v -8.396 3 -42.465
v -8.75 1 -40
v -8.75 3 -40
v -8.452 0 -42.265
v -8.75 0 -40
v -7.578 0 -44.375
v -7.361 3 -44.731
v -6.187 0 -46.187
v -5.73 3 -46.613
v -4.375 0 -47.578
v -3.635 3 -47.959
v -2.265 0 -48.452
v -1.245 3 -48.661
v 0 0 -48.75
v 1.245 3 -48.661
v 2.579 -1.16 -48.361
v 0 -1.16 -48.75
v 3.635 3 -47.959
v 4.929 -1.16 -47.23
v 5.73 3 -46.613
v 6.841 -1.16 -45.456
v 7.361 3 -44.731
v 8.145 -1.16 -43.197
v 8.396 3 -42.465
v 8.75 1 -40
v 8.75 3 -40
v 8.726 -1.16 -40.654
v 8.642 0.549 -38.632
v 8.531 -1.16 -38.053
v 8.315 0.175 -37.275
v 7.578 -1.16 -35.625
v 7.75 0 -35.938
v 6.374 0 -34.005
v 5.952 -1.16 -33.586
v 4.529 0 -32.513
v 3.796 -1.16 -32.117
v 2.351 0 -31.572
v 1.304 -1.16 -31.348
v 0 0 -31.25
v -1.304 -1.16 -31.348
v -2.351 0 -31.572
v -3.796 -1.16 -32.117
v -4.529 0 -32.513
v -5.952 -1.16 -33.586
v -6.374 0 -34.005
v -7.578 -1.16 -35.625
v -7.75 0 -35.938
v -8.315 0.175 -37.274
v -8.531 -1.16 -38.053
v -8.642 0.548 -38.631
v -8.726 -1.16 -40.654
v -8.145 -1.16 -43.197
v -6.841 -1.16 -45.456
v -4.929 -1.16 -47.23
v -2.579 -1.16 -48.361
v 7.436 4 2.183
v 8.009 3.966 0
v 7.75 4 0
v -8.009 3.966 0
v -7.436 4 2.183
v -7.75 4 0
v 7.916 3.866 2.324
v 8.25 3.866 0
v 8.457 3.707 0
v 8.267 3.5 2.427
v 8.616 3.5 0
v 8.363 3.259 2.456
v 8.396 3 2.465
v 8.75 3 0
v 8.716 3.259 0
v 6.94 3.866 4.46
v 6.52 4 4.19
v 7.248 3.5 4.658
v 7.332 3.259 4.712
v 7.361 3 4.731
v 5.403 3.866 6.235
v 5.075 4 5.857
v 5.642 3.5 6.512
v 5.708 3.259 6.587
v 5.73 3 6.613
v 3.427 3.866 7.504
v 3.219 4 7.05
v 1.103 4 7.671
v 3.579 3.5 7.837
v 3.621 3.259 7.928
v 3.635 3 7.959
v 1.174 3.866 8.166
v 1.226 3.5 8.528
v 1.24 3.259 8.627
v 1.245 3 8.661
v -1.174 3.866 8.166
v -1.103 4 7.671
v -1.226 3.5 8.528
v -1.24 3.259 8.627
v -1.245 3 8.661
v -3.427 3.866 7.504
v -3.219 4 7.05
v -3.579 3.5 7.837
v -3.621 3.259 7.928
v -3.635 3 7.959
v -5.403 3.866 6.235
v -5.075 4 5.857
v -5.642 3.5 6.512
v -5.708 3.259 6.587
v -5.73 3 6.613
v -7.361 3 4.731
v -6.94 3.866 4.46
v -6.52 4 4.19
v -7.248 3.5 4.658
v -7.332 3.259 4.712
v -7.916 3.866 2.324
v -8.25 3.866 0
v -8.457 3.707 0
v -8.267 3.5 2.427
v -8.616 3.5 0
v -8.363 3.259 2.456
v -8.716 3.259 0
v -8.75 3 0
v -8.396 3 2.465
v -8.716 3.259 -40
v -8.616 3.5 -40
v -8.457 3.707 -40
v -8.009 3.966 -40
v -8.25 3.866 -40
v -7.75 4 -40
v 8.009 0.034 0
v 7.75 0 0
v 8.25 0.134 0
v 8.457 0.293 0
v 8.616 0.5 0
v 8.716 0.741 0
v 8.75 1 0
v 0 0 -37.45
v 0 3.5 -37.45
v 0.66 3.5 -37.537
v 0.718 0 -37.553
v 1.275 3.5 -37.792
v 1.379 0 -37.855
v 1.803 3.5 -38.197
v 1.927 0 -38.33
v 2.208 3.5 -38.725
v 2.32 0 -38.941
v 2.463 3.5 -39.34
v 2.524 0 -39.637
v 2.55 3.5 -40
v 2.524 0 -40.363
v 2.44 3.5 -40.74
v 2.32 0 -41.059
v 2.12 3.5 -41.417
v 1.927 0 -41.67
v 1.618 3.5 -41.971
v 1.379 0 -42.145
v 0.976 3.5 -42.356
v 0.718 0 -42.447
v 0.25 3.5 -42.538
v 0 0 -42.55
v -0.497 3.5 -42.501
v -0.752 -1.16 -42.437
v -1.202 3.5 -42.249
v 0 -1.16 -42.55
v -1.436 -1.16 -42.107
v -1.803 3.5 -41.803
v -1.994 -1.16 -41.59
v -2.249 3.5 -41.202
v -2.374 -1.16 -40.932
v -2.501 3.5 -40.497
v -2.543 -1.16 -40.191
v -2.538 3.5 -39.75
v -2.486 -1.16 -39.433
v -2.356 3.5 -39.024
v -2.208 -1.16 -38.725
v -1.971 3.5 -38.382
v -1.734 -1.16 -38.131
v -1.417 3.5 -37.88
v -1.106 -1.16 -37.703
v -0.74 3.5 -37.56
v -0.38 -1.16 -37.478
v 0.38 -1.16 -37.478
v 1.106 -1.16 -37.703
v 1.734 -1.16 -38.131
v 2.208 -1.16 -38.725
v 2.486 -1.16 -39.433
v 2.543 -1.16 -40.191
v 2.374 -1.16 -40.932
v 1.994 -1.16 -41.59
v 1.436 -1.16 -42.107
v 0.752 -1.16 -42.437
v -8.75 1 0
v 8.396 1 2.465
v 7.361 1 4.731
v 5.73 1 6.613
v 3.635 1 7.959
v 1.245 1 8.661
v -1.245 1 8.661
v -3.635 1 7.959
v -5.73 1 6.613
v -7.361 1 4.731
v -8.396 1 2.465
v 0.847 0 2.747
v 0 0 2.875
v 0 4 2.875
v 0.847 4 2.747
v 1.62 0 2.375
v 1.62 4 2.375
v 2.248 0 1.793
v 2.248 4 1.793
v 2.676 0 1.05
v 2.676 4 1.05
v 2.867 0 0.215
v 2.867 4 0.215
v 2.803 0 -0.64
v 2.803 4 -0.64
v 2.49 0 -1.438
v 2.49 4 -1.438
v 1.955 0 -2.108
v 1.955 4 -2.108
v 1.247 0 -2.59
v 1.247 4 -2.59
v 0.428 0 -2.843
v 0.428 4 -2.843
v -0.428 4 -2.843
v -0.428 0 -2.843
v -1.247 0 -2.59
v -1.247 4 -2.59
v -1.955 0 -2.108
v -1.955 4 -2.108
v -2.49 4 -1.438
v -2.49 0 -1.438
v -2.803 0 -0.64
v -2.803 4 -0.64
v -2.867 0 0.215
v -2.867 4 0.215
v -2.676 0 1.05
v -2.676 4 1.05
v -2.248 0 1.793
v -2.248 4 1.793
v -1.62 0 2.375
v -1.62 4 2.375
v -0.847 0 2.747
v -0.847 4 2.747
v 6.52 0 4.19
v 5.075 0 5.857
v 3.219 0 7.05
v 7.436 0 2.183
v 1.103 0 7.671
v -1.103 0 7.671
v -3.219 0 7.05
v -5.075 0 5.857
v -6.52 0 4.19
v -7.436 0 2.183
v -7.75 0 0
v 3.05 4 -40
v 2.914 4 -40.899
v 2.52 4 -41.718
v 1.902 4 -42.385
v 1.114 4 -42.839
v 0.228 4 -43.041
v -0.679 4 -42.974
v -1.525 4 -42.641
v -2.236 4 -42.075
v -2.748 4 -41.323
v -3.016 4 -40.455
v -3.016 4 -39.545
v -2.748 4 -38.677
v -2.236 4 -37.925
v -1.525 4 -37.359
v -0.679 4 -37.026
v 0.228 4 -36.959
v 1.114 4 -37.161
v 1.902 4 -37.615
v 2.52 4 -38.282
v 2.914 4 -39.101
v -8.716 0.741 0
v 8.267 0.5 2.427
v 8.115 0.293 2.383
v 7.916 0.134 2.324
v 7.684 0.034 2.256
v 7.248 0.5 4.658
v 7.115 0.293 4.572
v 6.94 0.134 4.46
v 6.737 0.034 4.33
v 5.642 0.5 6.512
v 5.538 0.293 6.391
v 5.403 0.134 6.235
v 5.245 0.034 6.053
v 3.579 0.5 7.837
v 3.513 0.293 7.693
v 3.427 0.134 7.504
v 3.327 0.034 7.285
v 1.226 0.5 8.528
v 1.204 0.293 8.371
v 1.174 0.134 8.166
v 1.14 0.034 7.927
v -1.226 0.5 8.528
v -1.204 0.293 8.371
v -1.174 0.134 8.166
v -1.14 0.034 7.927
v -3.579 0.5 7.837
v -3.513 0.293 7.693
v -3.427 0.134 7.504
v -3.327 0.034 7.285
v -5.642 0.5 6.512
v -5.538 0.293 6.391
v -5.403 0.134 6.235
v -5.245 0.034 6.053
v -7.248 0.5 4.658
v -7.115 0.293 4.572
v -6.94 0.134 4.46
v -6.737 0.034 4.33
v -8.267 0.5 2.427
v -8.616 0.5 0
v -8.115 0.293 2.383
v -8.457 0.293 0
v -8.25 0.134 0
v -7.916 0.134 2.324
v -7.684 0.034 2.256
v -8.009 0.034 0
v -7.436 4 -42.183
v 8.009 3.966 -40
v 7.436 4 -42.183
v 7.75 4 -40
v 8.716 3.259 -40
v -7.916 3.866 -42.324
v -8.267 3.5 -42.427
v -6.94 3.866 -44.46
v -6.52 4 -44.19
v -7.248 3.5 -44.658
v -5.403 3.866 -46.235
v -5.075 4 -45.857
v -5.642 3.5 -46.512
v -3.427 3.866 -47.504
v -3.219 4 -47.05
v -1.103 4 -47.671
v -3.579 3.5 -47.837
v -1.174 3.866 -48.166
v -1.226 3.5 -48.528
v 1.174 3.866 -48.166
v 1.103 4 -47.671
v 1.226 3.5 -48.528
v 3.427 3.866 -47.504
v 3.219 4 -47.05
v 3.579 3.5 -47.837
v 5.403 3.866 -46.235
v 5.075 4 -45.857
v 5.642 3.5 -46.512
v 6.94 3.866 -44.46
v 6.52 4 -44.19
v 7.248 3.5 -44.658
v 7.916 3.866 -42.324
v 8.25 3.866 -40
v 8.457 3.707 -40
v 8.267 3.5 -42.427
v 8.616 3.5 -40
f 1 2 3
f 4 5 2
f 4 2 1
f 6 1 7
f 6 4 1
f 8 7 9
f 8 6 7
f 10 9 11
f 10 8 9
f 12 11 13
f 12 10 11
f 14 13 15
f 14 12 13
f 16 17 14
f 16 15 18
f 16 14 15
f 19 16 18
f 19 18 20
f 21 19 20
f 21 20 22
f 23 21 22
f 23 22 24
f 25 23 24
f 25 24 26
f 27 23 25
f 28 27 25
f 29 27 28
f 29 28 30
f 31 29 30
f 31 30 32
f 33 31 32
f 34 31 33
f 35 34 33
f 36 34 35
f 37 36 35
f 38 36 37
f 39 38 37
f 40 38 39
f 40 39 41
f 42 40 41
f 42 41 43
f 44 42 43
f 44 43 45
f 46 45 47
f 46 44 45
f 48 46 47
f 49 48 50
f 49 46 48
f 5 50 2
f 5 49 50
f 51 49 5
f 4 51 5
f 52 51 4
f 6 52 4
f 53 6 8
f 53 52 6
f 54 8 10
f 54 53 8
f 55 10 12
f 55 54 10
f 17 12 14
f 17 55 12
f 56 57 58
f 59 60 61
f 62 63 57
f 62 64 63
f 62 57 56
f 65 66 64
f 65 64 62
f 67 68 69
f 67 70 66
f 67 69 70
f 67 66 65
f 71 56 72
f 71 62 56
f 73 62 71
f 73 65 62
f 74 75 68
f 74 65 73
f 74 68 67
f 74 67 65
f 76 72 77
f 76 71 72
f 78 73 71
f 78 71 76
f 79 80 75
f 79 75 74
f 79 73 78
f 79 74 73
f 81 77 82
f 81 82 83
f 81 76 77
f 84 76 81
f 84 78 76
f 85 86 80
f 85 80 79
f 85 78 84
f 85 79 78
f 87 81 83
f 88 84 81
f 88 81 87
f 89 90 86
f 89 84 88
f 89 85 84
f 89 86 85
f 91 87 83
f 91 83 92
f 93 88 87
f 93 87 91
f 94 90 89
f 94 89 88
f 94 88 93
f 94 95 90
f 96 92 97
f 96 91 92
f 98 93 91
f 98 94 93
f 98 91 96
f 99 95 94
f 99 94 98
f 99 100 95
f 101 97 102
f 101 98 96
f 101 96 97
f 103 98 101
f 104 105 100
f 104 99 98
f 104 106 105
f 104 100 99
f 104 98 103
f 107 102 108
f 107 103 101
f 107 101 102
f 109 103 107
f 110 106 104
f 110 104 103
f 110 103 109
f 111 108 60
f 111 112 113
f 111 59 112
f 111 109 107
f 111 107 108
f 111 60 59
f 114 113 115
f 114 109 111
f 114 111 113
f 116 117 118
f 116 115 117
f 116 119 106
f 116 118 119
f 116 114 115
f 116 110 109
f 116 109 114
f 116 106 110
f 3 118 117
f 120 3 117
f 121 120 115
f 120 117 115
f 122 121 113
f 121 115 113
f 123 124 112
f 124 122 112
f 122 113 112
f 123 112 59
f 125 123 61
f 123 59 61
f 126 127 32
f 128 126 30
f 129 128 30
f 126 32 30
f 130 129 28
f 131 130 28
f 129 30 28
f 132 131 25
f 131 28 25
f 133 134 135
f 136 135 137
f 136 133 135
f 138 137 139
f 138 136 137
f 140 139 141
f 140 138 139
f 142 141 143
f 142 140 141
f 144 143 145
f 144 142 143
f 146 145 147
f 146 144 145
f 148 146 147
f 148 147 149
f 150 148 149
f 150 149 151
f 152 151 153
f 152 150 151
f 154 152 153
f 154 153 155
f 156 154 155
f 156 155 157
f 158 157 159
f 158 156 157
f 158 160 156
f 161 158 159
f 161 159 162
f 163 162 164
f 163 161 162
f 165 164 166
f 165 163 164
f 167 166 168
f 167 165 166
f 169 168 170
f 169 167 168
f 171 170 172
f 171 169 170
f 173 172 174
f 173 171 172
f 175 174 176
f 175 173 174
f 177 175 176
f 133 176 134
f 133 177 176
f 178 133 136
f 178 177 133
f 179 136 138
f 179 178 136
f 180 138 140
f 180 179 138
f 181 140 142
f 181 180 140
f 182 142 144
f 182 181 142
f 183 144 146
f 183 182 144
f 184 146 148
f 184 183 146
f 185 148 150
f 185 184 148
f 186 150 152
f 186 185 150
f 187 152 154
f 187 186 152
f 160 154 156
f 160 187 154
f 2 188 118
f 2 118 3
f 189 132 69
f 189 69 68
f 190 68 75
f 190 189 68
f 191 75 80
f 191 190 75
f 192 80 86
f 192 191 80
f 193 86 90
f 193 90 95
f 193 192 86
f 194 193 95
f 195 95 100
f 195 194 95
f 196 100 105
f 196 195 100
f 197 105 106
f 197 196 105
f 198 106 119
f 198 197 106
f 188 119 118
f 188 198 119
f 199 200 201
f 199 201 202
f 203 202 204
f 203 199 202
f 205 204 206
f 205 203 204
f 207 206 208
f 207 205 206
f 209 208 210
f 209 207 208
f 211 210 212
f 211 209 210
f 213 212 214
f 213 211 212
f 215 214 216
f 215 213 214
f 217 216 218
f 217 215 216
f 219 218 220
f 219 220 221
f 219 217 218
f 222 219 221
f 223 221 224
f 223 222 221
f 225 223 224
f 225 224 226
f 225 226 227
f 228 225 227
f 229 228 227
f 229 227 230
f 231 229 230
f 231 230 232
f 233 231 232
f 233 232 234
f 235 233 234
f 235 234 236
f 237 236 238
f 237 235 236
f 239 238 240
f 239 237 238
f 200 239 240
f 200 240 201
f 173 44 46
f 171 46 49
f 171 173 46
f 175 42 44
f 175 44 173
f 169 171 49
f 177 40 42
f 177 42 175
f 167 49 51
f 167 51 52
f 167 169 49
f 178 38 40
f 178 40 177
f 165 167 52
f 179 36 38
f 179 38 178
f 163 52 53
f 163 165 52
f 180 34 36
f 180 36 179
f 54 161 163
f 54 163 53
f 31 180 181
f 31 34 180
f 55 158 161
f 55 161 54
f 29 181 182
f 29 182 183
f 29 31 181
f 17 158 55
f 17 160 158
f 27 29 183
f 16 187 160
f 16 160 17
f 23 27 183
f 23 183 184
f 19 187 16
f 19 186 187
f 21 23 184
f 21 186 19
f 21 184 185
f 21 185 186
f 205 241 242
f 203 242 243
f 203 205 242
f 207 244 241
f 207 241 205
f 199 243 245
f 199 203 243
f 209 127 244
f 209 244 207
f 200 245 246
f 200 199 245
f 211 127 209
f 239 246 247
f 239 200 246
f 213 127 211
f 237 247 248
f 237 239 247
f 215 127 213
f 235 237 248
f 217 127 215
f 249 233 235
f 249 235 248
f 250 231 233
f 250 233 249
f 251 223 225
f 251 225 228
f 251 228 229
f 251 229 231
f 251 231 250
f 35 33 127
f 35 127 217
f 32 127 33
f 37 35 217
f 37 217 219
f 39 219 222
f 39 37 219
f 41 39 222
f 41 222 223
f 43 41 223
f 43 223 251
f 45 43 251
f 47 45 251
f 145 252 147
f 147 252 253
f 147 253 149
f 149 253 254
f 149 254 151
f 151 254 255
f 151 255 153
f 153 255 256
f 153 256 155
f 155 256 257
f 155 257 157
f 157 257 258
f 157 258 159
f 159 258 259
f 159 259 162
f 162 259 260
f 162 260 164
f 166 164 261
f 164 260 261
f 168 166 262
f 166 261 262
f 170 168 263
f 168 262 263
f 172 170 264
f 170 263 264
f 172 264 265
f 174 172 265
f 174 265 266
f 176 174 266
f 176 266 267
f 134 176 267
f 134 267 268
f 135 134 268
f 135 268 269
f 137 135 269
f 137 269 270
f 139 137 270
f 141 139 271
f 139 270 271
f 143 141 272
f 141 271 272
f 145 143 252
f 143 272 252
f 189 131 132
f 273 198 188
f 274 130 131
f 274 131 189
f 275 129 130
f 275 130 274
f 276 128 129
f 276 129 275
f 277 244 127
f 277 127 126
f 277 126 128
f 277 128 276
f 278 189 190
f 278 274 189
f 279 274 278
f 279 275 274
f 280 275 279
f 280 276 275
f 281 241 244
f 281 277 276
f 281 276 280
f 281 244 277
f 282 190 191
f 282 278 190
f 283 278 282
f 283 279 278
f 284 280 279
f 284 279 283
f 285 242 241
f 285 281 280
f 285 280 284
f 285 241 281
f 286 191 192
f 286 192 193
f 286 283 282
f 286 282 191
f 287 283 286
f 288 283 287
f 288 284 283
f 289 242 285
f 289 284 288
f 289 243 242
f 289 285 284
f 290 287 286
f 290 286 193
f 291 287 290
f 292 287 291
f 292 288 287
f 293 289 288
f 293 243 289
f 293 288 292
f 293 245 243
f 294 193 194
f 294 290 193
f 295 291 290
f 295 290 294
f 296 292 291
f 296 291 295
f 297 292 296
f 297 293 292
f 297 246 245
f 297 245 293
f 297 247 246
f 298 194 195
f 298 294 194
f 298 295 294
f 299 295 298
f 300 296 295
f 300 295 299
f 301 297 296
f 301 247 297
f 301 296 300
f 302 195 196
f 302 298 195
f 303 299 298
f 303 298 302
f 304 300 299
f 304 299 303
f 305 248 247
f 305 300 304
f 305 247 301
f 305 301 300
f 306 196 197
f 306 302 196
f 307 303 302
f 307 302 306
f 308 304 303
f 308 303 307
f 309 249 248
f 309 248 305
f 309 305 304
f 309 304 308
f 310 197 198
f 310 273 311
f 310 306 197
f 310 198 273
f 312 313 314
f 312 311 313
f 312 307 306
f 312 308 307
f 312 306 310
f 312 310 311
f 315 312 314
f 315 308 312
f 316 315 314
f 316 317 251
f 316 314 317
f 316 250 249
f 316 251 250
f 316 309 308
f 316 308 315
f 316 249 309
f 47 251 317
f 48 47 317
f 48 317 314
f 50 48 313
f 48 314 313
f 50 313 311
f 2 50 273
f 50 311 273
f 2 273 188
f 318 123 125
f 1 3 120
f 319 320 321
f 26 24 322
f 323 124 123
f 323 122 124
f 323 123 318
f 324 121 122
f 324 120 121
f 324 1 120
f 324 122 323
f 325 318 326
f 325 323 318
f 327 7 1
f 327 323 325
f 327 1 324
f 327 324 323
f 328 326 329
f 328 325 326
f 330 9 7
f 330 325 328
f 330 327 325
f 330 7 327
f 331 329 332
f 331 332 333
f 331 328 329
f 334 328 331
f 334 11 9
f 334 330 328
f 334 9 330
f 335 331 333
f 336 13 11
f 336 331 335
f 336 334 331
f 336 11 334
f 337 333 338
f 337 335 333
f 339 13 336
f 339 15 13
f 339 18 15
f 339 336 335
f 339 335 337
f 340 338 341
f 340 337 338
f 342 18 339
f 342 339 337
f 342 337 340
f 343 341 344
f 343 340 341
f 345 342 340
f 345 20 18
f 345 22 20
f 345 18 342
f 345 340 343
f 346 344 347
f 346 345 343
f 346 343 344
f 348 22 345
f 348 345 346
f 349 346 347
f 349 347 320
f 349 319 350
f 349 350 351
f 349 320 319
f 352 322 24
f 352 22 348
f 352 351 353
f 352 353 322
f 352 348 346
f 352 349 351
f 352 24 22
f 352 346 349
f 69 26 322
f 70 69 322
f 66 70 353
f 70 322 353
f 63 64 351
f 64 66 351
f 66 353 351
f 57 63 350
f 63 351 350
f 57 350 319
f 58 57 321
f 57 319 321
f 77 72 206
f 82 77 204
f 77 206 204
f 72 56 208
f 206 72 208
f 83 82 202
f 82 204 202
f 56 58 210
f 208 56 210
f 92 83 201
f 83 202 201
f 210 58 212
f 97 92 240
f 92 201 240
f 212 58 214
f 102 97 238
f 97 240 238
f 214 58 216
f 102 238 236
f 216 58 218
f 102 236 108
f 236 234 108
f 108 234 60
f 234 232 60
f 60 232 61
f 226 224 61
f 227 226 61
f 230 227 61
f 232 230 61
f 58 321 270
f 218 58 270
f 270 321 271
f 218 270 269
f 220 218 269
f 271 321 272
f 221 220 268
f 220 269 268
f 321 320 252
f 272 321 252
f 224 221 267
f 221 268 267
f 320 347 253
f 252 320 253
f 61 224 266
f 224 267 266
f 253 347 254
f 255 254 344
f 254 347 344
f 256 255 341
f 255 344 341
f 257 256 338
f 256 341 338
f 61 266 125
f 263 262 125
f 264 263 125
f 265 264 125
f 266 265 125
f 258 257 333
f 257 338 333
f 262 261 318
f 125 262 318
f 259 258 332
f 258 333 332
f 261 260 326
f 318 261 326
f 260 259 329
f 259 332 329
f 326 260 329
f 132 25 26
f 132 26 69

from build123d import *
from build123d.topology import SkipClean

# Parameters (mm, degrees)
SKETCH1_R           = 2.55
SKETCH1_R_2         = 2.875
BOSS_EXTRUDE1_DEPTH = 4
BOSS_EXTRUDE2_START = 5
SKETCH3_R           = 8.75
SKETCH3_R_2         = 2.55
BOSS_EXTRUDE2_DEPTH = 5
FILLET2_R           = 1
SKETCH5_R           = 8.75
CUT_EXTRUDE2_DEPTH  = 3.84


with BuildPart() as part:
    # Sketch1 → Boss-Extrude1 (new body)
    with BuildSketch(Plane(origin=(0, 0, 0), x_dir=(1, 0, 0), z_dir=(0, 1, 0))):
        with BuildLine():
            Line((-8.75, 0), (-8.75, 40))
            ThreePointArc((-8.75, 40), (0, 48.75), (8.75, 40))
            Line((8.75, 40), (8.75, 0))
            ThreePointArc((8.75, 0), (0, -8.75), (-8.75, 0))
        make_face()
        with Locations(Location((0, 40, 0), (0, 0, 270))):
            Circle(SKETCH1_R, mode=Mode.SUBTRACT)
        with Locations(Location((0, 0, 0), (0, 0, 270))):
            Circle(SKETCH1_R_2, mode=Mode.SUBTRACT)
    extrude(amount=BOSS_EXTRUDE1_DEPTH)

    # Sketch3 → Boss-Extrude2 (add)
    with SkipClean():  # the faces are left unmerged after this step: merging them gives an invalid solid
        with BuildSketch(Plane.XZ.offset(BOSS_EXTRUDE2_START)):
            with Locations(Location((0, -40, 0), (0, 0, 270))):
                Circle(SKETCH3_R)
            with Locations(Location((0, -40, 0), (0, 0, 270))):
                Circle(SKETCH3_R_2, mode=Mode.SUBTRACT)
        extrude(amount=-BOSS_EXTRUDE2_DEPTH)

    # Fillet2
    # the kernel refuses this fillet: 1 mm, written as the material it takes off along each edge
    with BuildSketch(Plane(origin=(0, 4, -40), x_dir=(-1, 0, 0), z_dir=(0, 0, 1))) as fillet2_piece_1:
        with BuildLine():
            CenterArc((8.75 - FILLET2_R, FILLET2_R), FILLET2_R, 270, 90)
            Line((8.75 - FILLET2_R, 0), (8.75, 0))
            Line((8.75, 0), (8.75, FILLET2_R))
        make_face()
    revolve(axis=Axis((0, 4, -40), (0, -1, 0)), revolution_arc=180, mode=Mode.SUBTRACT)
    with BuildSketch(Plane(origin=(-8.75, 4, 0), x_dir=(1, 0, 0), z_dir=(0, 0, -1))) as fillet2_piece_2:
        with BuildLine():
            CenterArc((FILLET2_R, FILLET2_R), FILLET2_R, 180, 90)
            Line((0, FILLET2_R), (0, 0))
            Line((0, 0), (FILLET2_R, 0))
        make_face()
    extrude(amount=40, mode=Mode.SUBTRACT)
    with BuildSketch(Plane(origin=(0, -5, -40), x_dir=(0, 0, -1), z_dir=(-1, 0, 0))) as fillet2_piece_3:
        with BuildLine():
            CenterArc((8.75 - FILLET2_R, -FILLET2_R), FILLET2_R, 0, 90)
            Line((8.75 - FILLET2_R, 0), (8.75, 0))
            Line((8.75, 0), (8.75, -FILLET2_R))
        make_face()
    revolve(axis=Axis((0, -5, -40), (0, -1, 0)), mode=Mode.SUBTRACT)
    with BuildSketch(Plane(origin=(0, 4, 0), x_dir=(1, 0, 0), z_dir=(0, 0, -1))) as fillet2_piece_4:
        with BuildLine():
            CenterArc((8.75 - FILLET2_R, FILLET2_R), FILLET2_R, 270, 90)
            Line((8.75 - FILLET2_R, 0), (8.75, 0))
            Line((8.75, 0), (8.75, FILLET2_R))
        make_face()
    revolve(axis=Axis((0, 4, 0), (0, -1, 0)), revolution_arc=180, mode=Mode.SUBTRACT)
    with BuildSketch(Plane(origin=(-8.75, 0, 0), x_dir=(1, 0, 0), z_dir=(0, 0, -1))) as fillet2_piece_5_section:
        with BuildLine():
            CenterArc((FILLET2_R, -FILLET2_R), FILLET2_R, 90, 90)
            Line((0, -FILLET2_R), (0, 0))
            Line((0, 0), (FILLET2_R, 0))
        make_face()
    fillet2_piece_5 = extrude(amount=44.25, mode=Mode.PRIVATE)
    fillet2_piece_5 = fillet2_piece_5 - Plane(origin=(0, 0, -40), x_dir=(0, 0, -1), z_dir=(0, -1, 0)) * Cylinder(8.75, 93, mode=Mode.PRIVATE)
    add(fillet2_piece_5, mode=Mode.SUBTRACT)
    with BuildSketch(Plane(origin=(8.75, 0, -44.25), x_dir=(0, 1, 0), z_dir=(0, 0, 1))) as fillet2_piece_6_section:
        with BuildLine():
            CenterArc((FILLET2_R, FILLET2_R), FILLET2_R, 180, 90)
            Line((0, FILLET2_R), (0, 0))
            Line((0, 0), (FILLET2_R, 0))
        make_face()
    fillet2_piece_6 = extrude(amount=44.25, mode=Mode.PRIVATE)
    fillet2_piece_6 = fillet2_piece_6 - Plane(origin=(0, 0, -40), x_dir=(0, 0, -1), z_dir=(0, -1, 0)) * Cylinder(8.75, 93, mode=Mode.PRIVATE)
    add(fillet2_piece_6, mode=Mode.SUBTRACT)
    with BuildSketch(Plane(origin=(0, 0, 0), x_dir=(1, 0, 0), z_dir=(0, 0, -1))) as fillet2_piece_7:
        with BuildLine():
            CenterArc((8.75 - FILLET2_R, -FILLET2_R), FILLET2_R, 0, 90)
            Line((8.75 - FILLET2_R, 0), (8.75, 0))
            Line((8.75, 0), (8.75, -FILLET2_R))
        make_face()
    revolve(axis=Axis((0, 0, 0), (0, -1, 0)), revolution_arc=180, mode=Mode.SUBTRACT)
    with BuildSketch(Plane(origin=(8.75, 4, -40), x_dir=(0, -1, 0), z_dir=(0, 0, 1))) as fillet2_piece_8:
        with BuildLine():
            CenterArc((FILLET2_R, -FILLET2_R), FILLET2_R, 90, 90)
            Line((0, -FILLET2_R), (0, 0))
            Line((0, 0), (FILLET2_R, 0))
        make_face()
    extrude(amount=40, mode=Mode.SUBTRACT)

    # Chamfer1: read off the stored shape, not the designer's step
    # Chamfer1 outline → Chamfer1 (revolve, cut)
    with BuildSketch(Plane.XY.offset(-40)):
        Polygon((3.05, -5), (2.55, -4.5), (2.55, -5), align=None)
        Polygon((2.55, 4), (2.55, 3.5), (3.05, 4), align=None)
    revolve(axis=Axis((0, 0, -40), (0, 1, 0)), mode=Mode.SUBTRACT)

    # Sketch5 → Cut-Extrude2 (cut)
    with BuildSketch(Plane.XZ.offset(5)):
        with Locations(Location((0, -40, 0), (0, 0, 270))):
            Circle(SKETCH5_R)
    extrude(amount=-CUT_EXTRUDE2_DEPTH, mode=Mode.SUBTRACT)


solid = part.part
